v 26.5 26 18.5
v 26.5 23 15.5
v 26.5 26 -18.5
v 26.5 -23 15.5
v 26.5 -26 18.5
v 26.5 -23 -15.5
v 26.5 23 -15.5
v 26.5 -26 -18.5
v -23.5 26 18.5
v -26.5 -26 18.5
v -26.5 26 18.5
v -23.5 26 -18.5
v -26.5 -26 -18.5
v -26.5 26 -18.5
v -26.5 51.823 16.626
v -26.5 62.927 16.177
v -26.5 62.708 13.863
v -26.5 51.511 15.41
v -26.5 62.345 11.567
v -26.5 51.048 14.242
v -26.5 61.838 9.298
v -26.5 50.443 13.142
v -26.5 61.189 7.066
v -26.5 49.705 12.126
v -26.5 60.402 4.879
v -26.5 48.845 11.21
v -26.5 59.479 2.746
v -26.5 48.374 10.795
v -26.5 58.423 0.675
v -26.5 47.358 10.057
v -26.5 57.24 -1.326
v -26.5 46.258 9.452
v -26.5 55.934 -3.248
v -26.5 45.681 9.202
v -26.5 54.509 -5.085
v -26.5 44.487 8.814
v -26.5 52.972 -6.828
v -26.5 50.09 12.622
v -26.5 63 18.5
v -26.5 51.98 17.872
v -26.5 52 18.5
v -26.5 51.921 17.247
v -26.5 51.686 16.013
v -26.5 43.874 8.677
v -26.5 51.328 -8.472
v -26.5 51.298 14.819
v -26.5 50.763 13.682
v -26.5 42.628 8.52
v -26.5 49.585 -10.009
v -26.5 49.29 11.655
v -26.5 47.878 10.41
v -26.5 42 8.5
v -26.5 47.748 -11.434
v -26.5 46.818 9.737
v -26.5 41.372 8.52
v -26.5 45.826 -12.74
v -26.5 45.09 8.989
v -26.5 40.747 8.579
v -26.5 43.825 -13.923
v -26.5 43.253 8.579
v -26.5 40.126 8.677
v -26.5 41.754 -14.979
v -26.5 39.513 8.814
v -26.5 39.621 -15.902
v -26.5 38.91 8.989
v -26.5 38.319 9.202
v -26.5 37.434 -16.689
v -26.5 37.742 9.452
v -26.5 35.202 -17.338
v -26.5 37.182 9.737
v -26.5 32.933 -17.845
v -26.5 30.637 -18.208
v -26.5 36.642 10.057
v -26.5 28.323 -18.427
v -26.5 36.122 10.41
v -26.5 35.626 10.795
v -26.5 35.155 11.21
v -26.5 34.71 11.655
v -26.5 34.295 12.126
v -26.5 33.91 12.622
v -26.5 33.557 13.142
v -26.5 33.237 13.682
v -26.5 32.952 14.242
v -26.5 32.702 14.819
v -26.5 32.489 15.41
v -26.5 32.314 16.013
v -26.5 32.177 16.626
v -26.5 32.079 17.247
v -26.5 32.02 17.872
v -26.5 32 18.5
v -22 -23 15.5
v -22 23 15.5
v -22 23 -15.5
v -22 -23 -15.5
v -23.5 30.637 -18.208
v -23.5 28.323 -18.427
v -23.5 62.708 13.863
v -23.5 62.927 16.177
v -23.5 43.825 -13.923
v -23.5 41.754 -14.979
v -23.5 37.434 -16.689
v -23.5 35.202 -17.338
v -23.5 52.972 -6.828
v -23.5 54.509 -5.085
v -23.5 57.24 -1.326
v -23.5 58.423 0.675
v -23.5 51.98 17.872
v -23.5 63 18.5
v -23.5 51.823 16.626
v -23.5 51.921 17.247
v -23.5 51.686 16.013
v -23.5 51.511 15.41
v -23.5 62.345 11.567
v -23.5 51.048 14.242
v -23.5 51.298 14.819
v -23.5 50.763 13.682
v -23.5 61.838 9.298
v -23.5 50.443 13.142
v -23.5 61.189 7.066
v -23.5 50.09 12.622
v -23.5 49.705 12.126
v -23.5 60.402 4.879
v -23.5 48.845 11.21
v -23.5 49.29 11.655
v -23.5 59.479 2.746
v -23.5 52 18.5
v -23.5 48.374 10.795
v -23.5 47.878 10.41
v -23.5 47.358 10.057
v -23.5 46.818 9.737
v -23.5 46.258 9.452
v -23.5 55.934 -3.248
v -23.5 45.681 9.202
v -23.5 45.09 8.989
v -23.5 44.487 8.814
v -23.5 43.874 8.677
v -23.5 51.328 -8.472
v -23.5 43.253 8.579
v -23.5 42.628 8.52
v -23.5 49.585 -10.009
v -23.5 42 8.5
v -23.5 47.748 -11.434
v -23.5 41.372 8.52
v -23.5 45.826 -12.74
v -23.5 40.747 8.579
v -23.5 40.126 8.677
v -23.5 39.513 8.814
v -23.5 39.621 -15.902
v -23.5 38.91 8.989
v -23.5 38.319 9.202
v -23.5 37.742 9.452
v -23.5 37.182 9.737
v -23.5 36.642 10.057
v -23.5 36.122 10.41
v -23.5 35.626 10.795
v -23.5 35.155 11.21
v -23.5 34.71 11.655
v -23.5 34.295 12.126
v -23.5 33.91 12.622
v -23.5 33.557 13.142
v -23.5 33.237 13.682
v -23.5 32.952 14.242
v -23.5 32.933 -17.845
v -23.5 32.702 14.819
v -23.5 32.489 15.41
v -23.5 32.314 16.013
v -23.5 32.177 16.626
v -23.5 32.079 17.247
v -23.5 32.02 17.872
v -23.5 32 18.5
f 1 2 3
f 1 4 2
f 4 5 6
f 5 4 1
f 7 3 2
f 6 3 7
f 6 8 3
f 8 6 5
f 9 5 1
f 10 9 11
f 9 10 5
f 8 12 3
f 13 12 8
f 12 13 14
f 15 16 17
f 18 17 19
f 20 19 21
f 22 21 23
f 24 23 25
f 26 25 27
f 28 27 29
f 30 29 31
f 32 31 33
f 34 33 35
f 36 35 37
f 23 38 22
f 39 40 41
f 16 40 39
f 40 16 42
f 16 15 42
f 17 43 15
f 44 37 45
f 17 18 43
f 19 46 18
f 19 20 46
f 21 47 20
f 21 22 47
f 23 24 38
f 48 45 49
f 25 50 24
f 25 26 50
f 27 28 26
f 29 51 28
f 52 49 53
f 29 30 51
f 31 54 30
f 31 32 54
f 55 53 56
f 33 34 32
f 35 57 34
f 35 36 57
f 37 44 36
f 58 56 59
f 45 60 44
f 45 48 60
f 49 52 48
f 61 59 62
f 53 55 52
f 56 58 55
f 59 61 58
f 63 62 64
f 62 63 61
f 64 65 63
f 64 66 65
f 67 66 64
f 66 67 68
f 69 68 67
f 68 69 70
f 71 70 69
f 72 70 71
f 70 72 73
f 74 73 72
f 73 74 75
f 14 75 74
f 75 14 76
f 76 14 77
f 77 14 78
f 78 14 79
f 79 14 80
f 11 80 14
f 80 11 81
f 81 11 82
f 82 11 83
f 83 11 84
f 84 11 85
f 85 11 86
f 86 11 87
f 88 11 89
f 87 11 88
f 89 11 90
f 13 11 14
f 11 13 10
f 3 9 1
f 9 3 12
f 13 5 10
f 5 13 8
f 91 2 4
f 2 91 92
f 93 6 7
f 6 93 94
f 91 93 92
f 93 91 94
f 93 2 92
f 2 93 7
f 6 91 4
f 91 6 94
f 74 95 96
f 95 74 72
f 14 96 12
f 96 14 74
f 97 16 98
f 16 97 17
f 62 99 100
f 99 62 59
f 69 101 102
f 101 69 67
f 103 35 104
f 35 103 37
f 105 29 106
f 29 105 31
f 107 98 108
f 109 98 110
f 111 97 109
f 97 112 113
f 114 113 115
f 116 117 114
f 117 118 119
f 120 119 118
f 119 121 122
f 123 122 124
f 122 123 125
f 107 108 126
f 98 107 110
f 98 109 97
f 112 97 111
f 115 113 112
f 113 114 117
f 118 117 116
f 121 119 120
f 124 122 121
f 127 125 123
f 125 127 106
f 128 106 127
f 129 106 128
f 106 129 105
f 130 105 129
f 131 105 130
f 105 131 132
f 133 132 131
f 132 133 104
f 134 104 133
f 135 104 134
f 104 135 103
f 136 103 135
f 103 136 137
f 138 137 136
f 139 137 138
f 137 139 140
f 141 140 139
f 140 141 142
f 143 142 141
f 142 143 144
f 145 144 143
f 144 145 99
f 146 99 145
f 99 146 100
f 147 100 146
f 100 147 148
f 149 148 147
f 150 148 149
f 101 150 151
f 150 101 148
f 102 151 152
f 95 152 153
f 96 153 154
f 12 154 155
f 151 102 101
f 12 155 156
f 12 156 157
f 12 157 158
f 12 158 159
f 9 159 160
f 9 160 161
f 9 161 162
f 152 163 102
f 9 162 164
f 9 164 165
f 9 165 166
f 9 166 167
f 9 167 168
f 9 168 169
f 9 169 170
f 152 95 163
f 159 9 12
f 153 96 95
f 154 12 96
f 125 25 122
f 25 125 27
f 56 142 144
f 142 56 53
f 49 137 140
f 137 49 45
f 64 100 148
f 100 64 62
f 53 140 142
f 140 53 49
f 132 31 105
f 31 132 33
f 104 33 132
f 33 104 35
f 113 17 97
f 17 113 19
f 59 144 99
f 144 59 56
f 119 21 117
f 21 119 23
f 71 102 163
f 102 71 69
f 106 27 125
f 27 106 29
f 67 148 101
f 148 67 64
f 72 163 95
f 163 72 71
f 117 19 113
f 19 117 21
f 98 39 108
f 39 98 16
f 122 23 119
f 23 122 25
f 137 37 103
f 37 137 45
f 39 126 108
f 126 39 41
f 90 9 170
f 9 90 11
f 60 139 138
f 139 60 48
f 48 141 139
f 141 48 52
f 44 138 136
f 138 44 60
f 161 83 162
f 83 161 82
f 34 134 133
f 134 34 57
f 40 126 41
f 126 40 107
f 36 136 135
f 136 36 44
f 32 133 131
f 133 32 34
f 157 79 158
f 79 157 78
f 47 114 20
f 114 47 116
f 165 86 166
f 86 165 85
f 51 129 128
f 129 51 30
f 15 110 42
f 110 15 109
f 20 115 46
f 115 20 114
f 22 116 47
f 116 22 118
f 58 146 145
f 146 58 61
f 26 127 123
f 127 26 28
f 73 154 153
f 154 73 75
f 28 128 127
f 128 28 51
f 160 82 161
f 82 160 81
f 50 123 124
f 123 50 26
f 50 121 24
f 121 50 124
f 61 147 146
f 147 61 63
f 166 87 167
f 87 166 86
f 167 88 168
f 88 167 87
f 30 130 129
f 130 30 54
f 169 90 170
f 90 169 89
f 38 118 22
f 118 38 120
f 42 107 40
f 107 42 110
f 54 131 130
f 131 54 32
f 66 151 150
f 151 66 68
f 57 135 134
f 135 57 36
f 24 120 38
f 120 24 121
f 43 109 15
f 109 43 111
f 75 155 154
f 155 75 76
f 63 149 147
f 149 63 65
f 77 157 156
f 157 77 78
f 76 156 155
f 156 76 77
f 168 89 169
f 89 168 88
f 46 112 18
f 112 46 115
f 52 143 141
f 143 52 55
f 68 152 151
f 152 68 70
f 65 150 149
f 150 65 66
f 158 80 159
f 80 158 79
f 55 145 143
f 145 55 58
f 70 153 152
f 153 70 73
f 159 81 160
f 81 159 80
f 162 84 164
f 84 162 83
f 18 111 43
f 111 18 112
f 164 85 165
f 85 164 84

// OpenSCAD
/*
 * A support for a curtain rod, on a blind
 */

module box(width=46, height=31, depth=50, ep=3) {
  rotate([0, 0, 0]) {
    difference() {
      translate([0, 0, 0]) {
         cube(size=[depth + (1 * ep), width + (2 * ep), height + (2 * ep)], center=true);
      }
      translate([ep, 0, 0]) {
         cube(size=[depth, width, height], center=true);
      }
    }
  }
}


module side(width=46, height=31, depth=50, ep=3, rodDiam=20, right=true) {
  rotate([0, 0, 0]) {
    translate([-(depth / 2), 0, 0]) {
      union() {
        cube(size=[ep, width + (2 * ep), height + (2 * ep)], center=true);
        translate([0, ((right ? 1 : -1) * width + ((right ? 1 : -1) * 2 * ep)) / 2, (height + (2 * ep)) / 2]) {
          rotate([right ? 0 : 180, 90, 0]) {
            difference() {
              cylinder(h=ep, d=2 * (height + (2 * ep)), $fn=100, center=true);
              // Hide the top
              translate([-(height + (2 * ep))/ 2, 0, 0]) {
                cube(size=[height + (2 * ep), 2 * (width + (0 * ep)), 2 * ep], center=true);
              }
              // Rod notch
              translate([0, 6 + (rodDiam / 2), 0]) {
                cylinder(d=rodDiam, h=3 * ep, $fn=100, center=true);
              }
            }
          }
        }
      }
    }
  }
}


RIGHT = true;

if (RIGHT) {
  union() {
    box();
    side(right=true);
  }
} else {
  union() {
    box();
    side(right=false);
  }
}
